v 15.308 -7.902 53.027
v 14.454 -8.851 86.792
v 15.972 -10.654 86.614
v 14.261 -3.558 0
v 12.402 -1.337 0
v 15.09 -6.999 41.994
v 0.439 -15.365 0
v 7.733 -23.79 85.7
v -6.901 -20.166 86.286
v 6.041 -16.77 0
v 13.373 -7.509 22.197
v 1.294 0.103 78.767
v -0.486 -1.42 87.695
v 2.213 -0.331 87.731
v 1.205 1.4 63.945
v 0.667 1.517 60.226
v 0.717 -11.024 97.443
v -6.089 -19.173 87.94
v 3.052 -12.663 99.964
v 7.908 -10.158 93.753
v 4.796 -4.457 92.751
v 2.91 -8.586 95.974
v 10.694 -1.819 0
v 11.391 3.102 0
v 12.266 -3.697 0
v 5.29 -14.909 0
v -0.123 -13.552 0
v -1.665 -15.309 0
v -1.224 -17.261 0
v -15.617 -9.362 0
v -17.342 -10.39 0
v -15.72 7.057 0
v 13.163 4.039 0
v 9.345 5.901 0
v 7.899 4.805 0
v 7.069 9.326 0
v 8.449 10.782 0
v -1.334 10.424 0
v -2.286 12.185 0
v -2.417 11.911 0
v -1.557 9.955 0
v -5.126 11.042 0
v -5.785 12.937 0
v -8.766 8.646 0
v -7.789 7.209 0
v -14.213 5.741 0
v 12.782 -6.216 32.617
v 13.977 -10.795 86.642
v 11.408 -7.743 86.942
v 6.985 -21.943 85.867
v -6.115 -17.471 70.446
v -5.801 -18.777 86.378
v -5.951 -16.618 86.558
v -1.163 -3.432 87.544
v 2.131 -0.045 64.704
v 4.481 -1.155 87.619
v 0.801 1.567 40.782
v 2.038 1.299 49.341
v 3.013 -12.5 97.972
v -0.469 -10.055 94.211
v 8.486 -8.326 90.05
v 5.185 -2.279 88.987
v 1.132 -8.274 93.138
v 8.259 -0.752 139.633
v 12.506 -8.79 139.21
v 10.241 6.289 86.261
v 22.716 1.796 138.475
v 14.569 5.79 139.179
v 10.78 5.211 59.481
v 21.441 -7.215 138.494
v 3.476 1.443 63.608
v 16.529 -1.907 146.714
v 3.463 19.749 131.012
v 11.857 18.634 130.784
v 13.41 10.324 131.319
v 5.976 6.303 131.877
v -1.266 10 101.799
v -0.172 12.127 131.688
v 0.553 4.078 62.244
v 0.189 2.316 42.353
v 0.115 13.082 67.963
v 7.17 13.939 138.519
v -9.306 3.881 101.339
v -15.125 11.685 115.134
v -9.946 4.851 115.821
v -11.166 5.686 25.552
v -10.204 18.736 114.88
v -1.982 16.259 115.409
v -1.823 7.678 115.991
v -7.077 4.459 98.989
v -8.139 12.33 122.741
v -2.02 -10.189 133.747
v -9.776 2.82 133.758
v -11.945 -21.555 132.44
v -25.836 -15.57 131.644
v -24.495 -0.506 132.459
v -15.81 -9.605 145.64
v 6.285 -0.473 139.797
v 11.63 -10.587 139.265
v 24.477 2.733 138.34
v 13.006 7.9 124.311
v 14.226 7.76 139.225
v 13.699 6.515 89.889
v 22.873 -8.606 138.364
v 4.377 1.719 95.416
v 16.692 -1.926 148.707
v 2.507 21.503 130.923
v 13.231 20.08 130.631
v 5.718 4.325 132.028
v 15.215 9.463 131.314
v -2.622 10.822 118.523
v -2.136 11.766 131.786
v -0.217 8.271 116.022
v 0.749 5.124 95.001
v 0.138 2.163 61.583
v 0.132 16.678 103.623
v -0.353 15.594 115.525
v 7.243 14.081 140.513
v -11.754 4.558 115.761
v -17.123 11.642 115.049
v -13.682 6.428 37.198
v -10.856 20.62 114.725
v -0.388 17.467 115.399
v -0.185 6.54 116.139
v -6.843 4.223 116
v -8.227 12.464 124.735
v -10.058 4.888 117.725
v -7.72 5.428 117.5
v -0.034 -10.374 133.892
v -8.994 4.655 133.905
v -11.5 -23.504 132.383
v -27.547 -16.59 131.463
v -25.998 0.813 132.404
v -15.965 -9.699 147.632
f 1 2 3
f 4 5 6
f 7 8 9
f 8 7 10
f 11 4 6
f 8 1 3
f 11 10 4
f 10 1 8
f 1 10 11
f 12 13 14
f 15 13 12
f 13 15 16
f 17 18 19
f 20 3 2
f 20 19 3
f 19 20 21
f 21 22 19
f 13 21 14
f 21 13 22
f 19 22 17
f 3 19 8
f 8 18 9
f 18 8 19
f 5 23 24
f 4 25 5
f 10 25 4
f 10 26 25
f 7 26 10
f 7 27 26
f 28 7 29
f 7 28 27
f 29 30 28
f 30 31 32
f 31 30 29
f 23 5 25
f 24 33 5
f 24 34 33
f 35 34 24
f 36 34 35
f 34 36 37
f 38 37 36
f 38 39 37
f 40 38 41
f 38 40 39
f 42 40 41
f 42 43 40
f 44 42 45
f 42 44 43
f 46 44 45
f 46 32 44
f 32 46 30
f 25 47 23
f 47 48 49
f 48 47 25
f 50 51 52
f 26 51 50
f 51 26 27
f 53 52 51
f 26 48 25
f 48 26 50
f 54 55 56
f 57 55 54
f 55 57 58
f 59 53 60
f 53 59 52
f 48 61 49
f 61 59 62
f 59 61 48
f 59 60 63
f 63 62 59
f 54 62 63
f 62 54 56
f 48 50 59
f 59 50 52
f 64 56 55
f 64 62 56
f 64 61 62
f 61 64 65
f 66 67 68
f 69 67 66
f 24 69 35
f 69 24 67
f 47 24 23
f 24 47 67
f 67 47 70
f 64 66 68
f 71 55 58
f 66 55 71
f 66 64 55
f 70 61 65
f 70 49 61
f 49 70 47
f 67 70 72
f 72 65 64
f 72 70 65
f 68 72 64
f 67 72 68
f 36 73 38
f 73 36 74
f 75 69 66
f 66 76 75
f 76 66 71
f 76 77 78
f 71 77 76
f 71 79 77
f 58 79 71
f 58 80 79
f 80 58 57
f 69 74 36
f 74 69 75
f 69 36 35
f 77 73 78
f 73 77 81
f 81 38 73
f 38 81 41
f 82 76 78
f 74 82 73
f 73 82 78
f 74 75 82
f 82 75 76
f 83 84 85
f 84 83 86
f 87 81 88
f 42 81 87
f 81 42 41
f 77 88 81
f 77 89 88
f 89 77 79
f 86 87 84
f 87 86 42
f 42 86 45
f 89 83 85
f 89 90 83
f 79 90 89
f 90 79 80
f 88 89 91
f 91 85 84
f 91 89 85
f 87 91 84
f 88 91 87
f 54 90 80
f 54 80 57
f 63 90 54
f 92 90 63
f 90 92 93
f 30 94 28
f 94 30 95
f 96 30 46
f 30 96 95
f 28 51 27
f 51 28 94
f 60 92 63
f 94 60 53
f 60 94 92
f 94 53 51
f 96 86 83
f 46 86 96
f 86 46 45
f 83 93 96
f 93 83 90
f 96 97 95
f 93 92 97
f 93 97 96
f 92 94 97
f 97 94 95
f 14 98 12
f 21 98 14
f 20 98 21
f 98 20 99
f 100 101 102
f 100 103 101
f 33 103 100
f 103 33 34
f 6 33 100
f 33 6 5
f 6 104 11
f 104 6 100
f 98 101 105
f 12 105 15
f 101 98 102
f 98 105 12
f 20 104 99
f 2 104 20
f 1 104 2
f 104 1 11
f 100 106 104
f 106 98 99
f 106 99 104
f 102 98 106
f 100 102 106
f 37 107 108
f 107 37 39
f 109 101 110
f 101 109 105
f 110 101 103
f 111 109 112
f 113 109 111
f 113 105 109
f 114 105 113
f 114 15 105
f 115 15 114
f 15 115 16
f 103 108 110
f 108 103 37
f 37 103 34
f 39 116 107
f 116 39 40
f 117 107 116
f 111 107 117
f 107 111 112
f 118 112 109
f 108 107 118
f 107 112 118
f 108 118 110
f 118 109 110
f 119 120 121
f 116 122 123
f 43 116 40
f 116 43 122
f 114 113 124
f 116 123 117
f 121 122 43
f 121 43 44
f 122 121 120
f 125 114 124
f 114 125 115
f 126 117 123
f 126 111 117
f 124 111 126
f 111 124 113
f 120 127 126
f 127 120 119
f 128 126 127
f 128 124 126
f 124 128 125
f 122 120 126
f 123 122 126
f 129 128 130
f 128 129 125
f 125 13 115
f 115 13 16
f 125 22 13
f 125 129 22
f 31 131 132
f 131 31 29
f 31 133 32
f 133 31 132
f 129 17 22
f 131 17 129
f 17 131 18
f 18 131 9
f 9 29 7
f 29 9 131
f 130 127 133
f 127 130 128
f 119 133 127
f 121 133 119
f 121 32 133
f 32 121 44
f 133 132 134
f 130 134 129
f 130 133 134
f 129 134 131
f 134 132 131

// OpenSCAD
/*
 * Copyright 2021 Code and Make (codeandmake.com)
 * 
 * Permission is hereby granted, free of charge, to any person obtaining a copy
 * of this software and associated documentation files (the "Software"), to deal
 * in the Software without restriction, including without limitation the rights
 * to use, copy, modify, merge, publish, distribute, sublicense, and/or sell
 * copies of the Software, and to permit persons to whom the Software is
 * furnished to do so, subject to the following conditions:
 * 
 * The above copyright notice and this permission notice shall be included in
 * all copies or substantial portions of the Software.
 * 
 * THE SOFTWARE IS PROVIDED "AS IS", WITHOUT WARRANTY OF ANY KIND, EXPRESS OR
 * IMPLIED, INCLUDING BUT NOT LIMITED TO THE WARRANTIES OF MERCHANTABILITY,
 * FITNESS FOR A PARTICULAR PURPOSE AND NONINFRINGEMENT. IN NO EVENT SHALL THE
 * AUTHORS OR COPYRIGHT HOLDERS BE LIABLE FOR ANY CLAIM, DAMAGES OR OTHER
 * LIABILITY, WHETHER IN AN ACTION OF CONTRACT, TORT OR OTHERWISE, ARISING FROM,
 * OUT OF OR IN CONNECTION WITH THE SOFTWARE OR THE USE OR OTHER DEALINGS IN THE
 * SOFTWARE.
 */

/*
 * Crystal Generator by Code and Make (https://codeandmake.com/)
 *
 * https://codeandmake.com/post/crystal-generator
 *
 * Crystal Generator v1.2 (14 June 2021)
 */
 
 /*
 * Modified by TAKTAK to act as a library
 */

module crystalGenerator(
    Randomness = 0,
    Seed = 0,
    Number_of_Shards = 3,
    Shard_Sides = 6,
    Shard_Length = 100,
    Shard_Diameter = 25,
    Shard_Tilt = 20,
    Shard_Offset = 10,
    Shard_Length_Variance_Percentage = 50,
    Shard_Diameter_Variance_Percentage = 20,
    Shard_Tilt_Variance_Percentage = 20,
    Shard_Offset_Variance_Percentage = 20,
    Shard_Spacing_Variance_Percentage = 50,
    Hollow_Shards = 0,
    Hollow_Base = 1,
    Hollow_Shard_Wall_Thickness = 2,
    Base_Type = 2,
    Base_Thickness = 3
) {
    shardLengthMin = Shard_Length - (Shard_Length * Shard_Length_Variance_Percentage / 100 / 2);
    shardLengthMax = Shard_Length + (Shard_Length * Shard_Length_Variance_Percentage / 100 / 2);

    shardDiameterMin = Shard_Diameter - (Shard_Diameter * Shard_Diameter_Variance_Percentage / 100 / 2);
    shardDiameterMax = Shard_Diameter + (Shard_Diameter * Shard_Diameter_Variance_Percentage / 100 / 2);

    shardTiltMin = Shard_Tilt - (Shard_Tilt * Shard_Tilt_Variance_Percentage / 100 / 2);
    // clamp to max of 45 degrees for unsupported printing
    shardTiltMax = min(Shard_Tilt + (Shard_Tilt * Shard_Tilt_Variance_Percentage / 100 / 2), 45);

    shardOffsetMin = Shard_Offset - (Shard_Offset * Shard_Offset_Variance_Percentage / 100 / 2);
    shardOffsetMax = Shard_Offset + (Shard_Offset * Shard_Offset_Variance_Percentage / 100 / 2);

    shardSpacing = 360 / Number_of_Shards;
    shardSpacingAdjustMin = - (shardSpacing * Shard_Spacing_Variance_Percentage / 100 / 2);
    shardSpacingAdjustMax = + (shardSpacing * Shard_Spacing_Variance_Percentage / 100 / 2);

    // base radius without bevel
    baseRadius = shardOffsetMax + (shardDiameterMax * 0.75);

    seeds = (Randomness ? rands(0, 2147483646, Number_of_Shards + 5, Seed) : rands(0, 2147483646, Number_of_Shards + 5));

    shardTilts = rands(shardTiltMin, shardTiltMax, Number_of_Shards, seeds[0]);
    shardOffsets = rands(shardOffsetMin, shardOffsetMax, Number_of_Shards, seeds[1]);
    shardZRotations = rands(0, 360, Number_of_Shards, seeds[2]);
    shardSpacingAdjusts = rands(shardSpacingAdjustMin, shardSpacingAdjustMax, Number_of_Shards, seeds[3]);
    
    // cache random values
    shardDiameters = rands(shardDiameterMin, shardDiameterMax, Number_of_Shards, seeds[4]);
    
    // clamp to diameter so that we always have a crystal shape
    shardLengths =  [ for (i = [0:Number_of_Shards - 1]) max(rands(shardLengthMin, shardLengthMax, 1, seeds[5 + i])[0], shardDiameters[i]) ];

    module shard(i, inside) {
        shardRadius = (shardDiameters[i] / 2);
        shardLength = shardLengths[i];
        shardTilt = shardTilts[i];
        shardOffset = shardOffsets[i];
        shardZrotation = shardZRotations[i];
        insideAdjust = (inside ? Hollow_Shard_Wall_Thickness : 0);

        translate([0, -shardOffset, 0]) {
            intersection() {
                if (!inside) {
                    cylinder(r = (shardLength + shardRadius) * cos(shardTilt), h = (shardLength + shardRadius) * cos(shardTilt));
                }
                rotate([shardTilt, 0, 0]) {
                    rotate([0, 0, shardZrotation]) {
                        cylinder(r = shardRadius - insideAdjust, h = (shardLength - shardRadius) * 2, center = true, $fn = Shard_Sides);
                        translate([0, 0, shardLength - shardRadius]) {
                            cylinder(r1 = shardRadius - insideAdjust, r2 = 0, h = shardRadius - insideAdjust, $fn = Shard_Sides);
                        }
                    }
                }
            }
        }
    }

    module hollowShards() {
        for (i=[0:Number_of_Shards - 1]) {
            rotate([0, 0, (shardSpacing * i) + shardSpacingAdjusts[i]]) {
                shard(i, true);
            }
        }
    }

    module hollowBaseCutout() {
        translate([0, 0, -0.5]) {
            linear_extrude(height = Base_Thickness + 1, convexity = 10) {
                projection(cut = true) {
                    hollowShards();
                };
            }
        }
    }

    module base() {
        if (Base_Type == 1) {
            cylinder(r = baseRadius, h = Base_Thickness, $fn = 100);
        }
        if (Base_Type == 2) {
            hull() {
                rotate_extrude(convexity=10, $fn = 100) {
                    translate([baseRadius, 0, 0]) {
                        intersection() {
                            circle(r=Base_Thickness);
                            square(size=[Base_Thickness, Base_Thickness]);
                        }
                    }
                }
            }
        }
    }

    for (i=[0:Number_of_Shards - 1]) {
        difference() {
            rotate([0, 0, (shardSpacing * i) + shardSpacingAdjusts[i]]) {
                shard(i);
            }

            if (Hollow_Shards) {
                hollowShards();
            }
        }
    }

    if (Base_Type != 0) {
        translate([0, 0, -Base_Thickness]) {
            difference() {
                base();
                if (Hollow_Shards && Hollow_Base) {
                    hollowBaseCutout();
                }
            }
        }
    }
}

crystalGenerator(
    Randomness = 1,
    Seed = 156,
    Number_of_Shards = 5,
    Shard_Sides = 5,
    Shard_Length = 120,
    Shard_Tilt = 5,
    Shard_Offset = 5,
    Shard_Length_Variance_Percentage = 80,
    Shard_Diameter_Variance_Percentage = 70,
    Shard_Tilt_Variance_Percentage = 20,
    Hollow_Shards = 1,
    Base_Type = 0
);
